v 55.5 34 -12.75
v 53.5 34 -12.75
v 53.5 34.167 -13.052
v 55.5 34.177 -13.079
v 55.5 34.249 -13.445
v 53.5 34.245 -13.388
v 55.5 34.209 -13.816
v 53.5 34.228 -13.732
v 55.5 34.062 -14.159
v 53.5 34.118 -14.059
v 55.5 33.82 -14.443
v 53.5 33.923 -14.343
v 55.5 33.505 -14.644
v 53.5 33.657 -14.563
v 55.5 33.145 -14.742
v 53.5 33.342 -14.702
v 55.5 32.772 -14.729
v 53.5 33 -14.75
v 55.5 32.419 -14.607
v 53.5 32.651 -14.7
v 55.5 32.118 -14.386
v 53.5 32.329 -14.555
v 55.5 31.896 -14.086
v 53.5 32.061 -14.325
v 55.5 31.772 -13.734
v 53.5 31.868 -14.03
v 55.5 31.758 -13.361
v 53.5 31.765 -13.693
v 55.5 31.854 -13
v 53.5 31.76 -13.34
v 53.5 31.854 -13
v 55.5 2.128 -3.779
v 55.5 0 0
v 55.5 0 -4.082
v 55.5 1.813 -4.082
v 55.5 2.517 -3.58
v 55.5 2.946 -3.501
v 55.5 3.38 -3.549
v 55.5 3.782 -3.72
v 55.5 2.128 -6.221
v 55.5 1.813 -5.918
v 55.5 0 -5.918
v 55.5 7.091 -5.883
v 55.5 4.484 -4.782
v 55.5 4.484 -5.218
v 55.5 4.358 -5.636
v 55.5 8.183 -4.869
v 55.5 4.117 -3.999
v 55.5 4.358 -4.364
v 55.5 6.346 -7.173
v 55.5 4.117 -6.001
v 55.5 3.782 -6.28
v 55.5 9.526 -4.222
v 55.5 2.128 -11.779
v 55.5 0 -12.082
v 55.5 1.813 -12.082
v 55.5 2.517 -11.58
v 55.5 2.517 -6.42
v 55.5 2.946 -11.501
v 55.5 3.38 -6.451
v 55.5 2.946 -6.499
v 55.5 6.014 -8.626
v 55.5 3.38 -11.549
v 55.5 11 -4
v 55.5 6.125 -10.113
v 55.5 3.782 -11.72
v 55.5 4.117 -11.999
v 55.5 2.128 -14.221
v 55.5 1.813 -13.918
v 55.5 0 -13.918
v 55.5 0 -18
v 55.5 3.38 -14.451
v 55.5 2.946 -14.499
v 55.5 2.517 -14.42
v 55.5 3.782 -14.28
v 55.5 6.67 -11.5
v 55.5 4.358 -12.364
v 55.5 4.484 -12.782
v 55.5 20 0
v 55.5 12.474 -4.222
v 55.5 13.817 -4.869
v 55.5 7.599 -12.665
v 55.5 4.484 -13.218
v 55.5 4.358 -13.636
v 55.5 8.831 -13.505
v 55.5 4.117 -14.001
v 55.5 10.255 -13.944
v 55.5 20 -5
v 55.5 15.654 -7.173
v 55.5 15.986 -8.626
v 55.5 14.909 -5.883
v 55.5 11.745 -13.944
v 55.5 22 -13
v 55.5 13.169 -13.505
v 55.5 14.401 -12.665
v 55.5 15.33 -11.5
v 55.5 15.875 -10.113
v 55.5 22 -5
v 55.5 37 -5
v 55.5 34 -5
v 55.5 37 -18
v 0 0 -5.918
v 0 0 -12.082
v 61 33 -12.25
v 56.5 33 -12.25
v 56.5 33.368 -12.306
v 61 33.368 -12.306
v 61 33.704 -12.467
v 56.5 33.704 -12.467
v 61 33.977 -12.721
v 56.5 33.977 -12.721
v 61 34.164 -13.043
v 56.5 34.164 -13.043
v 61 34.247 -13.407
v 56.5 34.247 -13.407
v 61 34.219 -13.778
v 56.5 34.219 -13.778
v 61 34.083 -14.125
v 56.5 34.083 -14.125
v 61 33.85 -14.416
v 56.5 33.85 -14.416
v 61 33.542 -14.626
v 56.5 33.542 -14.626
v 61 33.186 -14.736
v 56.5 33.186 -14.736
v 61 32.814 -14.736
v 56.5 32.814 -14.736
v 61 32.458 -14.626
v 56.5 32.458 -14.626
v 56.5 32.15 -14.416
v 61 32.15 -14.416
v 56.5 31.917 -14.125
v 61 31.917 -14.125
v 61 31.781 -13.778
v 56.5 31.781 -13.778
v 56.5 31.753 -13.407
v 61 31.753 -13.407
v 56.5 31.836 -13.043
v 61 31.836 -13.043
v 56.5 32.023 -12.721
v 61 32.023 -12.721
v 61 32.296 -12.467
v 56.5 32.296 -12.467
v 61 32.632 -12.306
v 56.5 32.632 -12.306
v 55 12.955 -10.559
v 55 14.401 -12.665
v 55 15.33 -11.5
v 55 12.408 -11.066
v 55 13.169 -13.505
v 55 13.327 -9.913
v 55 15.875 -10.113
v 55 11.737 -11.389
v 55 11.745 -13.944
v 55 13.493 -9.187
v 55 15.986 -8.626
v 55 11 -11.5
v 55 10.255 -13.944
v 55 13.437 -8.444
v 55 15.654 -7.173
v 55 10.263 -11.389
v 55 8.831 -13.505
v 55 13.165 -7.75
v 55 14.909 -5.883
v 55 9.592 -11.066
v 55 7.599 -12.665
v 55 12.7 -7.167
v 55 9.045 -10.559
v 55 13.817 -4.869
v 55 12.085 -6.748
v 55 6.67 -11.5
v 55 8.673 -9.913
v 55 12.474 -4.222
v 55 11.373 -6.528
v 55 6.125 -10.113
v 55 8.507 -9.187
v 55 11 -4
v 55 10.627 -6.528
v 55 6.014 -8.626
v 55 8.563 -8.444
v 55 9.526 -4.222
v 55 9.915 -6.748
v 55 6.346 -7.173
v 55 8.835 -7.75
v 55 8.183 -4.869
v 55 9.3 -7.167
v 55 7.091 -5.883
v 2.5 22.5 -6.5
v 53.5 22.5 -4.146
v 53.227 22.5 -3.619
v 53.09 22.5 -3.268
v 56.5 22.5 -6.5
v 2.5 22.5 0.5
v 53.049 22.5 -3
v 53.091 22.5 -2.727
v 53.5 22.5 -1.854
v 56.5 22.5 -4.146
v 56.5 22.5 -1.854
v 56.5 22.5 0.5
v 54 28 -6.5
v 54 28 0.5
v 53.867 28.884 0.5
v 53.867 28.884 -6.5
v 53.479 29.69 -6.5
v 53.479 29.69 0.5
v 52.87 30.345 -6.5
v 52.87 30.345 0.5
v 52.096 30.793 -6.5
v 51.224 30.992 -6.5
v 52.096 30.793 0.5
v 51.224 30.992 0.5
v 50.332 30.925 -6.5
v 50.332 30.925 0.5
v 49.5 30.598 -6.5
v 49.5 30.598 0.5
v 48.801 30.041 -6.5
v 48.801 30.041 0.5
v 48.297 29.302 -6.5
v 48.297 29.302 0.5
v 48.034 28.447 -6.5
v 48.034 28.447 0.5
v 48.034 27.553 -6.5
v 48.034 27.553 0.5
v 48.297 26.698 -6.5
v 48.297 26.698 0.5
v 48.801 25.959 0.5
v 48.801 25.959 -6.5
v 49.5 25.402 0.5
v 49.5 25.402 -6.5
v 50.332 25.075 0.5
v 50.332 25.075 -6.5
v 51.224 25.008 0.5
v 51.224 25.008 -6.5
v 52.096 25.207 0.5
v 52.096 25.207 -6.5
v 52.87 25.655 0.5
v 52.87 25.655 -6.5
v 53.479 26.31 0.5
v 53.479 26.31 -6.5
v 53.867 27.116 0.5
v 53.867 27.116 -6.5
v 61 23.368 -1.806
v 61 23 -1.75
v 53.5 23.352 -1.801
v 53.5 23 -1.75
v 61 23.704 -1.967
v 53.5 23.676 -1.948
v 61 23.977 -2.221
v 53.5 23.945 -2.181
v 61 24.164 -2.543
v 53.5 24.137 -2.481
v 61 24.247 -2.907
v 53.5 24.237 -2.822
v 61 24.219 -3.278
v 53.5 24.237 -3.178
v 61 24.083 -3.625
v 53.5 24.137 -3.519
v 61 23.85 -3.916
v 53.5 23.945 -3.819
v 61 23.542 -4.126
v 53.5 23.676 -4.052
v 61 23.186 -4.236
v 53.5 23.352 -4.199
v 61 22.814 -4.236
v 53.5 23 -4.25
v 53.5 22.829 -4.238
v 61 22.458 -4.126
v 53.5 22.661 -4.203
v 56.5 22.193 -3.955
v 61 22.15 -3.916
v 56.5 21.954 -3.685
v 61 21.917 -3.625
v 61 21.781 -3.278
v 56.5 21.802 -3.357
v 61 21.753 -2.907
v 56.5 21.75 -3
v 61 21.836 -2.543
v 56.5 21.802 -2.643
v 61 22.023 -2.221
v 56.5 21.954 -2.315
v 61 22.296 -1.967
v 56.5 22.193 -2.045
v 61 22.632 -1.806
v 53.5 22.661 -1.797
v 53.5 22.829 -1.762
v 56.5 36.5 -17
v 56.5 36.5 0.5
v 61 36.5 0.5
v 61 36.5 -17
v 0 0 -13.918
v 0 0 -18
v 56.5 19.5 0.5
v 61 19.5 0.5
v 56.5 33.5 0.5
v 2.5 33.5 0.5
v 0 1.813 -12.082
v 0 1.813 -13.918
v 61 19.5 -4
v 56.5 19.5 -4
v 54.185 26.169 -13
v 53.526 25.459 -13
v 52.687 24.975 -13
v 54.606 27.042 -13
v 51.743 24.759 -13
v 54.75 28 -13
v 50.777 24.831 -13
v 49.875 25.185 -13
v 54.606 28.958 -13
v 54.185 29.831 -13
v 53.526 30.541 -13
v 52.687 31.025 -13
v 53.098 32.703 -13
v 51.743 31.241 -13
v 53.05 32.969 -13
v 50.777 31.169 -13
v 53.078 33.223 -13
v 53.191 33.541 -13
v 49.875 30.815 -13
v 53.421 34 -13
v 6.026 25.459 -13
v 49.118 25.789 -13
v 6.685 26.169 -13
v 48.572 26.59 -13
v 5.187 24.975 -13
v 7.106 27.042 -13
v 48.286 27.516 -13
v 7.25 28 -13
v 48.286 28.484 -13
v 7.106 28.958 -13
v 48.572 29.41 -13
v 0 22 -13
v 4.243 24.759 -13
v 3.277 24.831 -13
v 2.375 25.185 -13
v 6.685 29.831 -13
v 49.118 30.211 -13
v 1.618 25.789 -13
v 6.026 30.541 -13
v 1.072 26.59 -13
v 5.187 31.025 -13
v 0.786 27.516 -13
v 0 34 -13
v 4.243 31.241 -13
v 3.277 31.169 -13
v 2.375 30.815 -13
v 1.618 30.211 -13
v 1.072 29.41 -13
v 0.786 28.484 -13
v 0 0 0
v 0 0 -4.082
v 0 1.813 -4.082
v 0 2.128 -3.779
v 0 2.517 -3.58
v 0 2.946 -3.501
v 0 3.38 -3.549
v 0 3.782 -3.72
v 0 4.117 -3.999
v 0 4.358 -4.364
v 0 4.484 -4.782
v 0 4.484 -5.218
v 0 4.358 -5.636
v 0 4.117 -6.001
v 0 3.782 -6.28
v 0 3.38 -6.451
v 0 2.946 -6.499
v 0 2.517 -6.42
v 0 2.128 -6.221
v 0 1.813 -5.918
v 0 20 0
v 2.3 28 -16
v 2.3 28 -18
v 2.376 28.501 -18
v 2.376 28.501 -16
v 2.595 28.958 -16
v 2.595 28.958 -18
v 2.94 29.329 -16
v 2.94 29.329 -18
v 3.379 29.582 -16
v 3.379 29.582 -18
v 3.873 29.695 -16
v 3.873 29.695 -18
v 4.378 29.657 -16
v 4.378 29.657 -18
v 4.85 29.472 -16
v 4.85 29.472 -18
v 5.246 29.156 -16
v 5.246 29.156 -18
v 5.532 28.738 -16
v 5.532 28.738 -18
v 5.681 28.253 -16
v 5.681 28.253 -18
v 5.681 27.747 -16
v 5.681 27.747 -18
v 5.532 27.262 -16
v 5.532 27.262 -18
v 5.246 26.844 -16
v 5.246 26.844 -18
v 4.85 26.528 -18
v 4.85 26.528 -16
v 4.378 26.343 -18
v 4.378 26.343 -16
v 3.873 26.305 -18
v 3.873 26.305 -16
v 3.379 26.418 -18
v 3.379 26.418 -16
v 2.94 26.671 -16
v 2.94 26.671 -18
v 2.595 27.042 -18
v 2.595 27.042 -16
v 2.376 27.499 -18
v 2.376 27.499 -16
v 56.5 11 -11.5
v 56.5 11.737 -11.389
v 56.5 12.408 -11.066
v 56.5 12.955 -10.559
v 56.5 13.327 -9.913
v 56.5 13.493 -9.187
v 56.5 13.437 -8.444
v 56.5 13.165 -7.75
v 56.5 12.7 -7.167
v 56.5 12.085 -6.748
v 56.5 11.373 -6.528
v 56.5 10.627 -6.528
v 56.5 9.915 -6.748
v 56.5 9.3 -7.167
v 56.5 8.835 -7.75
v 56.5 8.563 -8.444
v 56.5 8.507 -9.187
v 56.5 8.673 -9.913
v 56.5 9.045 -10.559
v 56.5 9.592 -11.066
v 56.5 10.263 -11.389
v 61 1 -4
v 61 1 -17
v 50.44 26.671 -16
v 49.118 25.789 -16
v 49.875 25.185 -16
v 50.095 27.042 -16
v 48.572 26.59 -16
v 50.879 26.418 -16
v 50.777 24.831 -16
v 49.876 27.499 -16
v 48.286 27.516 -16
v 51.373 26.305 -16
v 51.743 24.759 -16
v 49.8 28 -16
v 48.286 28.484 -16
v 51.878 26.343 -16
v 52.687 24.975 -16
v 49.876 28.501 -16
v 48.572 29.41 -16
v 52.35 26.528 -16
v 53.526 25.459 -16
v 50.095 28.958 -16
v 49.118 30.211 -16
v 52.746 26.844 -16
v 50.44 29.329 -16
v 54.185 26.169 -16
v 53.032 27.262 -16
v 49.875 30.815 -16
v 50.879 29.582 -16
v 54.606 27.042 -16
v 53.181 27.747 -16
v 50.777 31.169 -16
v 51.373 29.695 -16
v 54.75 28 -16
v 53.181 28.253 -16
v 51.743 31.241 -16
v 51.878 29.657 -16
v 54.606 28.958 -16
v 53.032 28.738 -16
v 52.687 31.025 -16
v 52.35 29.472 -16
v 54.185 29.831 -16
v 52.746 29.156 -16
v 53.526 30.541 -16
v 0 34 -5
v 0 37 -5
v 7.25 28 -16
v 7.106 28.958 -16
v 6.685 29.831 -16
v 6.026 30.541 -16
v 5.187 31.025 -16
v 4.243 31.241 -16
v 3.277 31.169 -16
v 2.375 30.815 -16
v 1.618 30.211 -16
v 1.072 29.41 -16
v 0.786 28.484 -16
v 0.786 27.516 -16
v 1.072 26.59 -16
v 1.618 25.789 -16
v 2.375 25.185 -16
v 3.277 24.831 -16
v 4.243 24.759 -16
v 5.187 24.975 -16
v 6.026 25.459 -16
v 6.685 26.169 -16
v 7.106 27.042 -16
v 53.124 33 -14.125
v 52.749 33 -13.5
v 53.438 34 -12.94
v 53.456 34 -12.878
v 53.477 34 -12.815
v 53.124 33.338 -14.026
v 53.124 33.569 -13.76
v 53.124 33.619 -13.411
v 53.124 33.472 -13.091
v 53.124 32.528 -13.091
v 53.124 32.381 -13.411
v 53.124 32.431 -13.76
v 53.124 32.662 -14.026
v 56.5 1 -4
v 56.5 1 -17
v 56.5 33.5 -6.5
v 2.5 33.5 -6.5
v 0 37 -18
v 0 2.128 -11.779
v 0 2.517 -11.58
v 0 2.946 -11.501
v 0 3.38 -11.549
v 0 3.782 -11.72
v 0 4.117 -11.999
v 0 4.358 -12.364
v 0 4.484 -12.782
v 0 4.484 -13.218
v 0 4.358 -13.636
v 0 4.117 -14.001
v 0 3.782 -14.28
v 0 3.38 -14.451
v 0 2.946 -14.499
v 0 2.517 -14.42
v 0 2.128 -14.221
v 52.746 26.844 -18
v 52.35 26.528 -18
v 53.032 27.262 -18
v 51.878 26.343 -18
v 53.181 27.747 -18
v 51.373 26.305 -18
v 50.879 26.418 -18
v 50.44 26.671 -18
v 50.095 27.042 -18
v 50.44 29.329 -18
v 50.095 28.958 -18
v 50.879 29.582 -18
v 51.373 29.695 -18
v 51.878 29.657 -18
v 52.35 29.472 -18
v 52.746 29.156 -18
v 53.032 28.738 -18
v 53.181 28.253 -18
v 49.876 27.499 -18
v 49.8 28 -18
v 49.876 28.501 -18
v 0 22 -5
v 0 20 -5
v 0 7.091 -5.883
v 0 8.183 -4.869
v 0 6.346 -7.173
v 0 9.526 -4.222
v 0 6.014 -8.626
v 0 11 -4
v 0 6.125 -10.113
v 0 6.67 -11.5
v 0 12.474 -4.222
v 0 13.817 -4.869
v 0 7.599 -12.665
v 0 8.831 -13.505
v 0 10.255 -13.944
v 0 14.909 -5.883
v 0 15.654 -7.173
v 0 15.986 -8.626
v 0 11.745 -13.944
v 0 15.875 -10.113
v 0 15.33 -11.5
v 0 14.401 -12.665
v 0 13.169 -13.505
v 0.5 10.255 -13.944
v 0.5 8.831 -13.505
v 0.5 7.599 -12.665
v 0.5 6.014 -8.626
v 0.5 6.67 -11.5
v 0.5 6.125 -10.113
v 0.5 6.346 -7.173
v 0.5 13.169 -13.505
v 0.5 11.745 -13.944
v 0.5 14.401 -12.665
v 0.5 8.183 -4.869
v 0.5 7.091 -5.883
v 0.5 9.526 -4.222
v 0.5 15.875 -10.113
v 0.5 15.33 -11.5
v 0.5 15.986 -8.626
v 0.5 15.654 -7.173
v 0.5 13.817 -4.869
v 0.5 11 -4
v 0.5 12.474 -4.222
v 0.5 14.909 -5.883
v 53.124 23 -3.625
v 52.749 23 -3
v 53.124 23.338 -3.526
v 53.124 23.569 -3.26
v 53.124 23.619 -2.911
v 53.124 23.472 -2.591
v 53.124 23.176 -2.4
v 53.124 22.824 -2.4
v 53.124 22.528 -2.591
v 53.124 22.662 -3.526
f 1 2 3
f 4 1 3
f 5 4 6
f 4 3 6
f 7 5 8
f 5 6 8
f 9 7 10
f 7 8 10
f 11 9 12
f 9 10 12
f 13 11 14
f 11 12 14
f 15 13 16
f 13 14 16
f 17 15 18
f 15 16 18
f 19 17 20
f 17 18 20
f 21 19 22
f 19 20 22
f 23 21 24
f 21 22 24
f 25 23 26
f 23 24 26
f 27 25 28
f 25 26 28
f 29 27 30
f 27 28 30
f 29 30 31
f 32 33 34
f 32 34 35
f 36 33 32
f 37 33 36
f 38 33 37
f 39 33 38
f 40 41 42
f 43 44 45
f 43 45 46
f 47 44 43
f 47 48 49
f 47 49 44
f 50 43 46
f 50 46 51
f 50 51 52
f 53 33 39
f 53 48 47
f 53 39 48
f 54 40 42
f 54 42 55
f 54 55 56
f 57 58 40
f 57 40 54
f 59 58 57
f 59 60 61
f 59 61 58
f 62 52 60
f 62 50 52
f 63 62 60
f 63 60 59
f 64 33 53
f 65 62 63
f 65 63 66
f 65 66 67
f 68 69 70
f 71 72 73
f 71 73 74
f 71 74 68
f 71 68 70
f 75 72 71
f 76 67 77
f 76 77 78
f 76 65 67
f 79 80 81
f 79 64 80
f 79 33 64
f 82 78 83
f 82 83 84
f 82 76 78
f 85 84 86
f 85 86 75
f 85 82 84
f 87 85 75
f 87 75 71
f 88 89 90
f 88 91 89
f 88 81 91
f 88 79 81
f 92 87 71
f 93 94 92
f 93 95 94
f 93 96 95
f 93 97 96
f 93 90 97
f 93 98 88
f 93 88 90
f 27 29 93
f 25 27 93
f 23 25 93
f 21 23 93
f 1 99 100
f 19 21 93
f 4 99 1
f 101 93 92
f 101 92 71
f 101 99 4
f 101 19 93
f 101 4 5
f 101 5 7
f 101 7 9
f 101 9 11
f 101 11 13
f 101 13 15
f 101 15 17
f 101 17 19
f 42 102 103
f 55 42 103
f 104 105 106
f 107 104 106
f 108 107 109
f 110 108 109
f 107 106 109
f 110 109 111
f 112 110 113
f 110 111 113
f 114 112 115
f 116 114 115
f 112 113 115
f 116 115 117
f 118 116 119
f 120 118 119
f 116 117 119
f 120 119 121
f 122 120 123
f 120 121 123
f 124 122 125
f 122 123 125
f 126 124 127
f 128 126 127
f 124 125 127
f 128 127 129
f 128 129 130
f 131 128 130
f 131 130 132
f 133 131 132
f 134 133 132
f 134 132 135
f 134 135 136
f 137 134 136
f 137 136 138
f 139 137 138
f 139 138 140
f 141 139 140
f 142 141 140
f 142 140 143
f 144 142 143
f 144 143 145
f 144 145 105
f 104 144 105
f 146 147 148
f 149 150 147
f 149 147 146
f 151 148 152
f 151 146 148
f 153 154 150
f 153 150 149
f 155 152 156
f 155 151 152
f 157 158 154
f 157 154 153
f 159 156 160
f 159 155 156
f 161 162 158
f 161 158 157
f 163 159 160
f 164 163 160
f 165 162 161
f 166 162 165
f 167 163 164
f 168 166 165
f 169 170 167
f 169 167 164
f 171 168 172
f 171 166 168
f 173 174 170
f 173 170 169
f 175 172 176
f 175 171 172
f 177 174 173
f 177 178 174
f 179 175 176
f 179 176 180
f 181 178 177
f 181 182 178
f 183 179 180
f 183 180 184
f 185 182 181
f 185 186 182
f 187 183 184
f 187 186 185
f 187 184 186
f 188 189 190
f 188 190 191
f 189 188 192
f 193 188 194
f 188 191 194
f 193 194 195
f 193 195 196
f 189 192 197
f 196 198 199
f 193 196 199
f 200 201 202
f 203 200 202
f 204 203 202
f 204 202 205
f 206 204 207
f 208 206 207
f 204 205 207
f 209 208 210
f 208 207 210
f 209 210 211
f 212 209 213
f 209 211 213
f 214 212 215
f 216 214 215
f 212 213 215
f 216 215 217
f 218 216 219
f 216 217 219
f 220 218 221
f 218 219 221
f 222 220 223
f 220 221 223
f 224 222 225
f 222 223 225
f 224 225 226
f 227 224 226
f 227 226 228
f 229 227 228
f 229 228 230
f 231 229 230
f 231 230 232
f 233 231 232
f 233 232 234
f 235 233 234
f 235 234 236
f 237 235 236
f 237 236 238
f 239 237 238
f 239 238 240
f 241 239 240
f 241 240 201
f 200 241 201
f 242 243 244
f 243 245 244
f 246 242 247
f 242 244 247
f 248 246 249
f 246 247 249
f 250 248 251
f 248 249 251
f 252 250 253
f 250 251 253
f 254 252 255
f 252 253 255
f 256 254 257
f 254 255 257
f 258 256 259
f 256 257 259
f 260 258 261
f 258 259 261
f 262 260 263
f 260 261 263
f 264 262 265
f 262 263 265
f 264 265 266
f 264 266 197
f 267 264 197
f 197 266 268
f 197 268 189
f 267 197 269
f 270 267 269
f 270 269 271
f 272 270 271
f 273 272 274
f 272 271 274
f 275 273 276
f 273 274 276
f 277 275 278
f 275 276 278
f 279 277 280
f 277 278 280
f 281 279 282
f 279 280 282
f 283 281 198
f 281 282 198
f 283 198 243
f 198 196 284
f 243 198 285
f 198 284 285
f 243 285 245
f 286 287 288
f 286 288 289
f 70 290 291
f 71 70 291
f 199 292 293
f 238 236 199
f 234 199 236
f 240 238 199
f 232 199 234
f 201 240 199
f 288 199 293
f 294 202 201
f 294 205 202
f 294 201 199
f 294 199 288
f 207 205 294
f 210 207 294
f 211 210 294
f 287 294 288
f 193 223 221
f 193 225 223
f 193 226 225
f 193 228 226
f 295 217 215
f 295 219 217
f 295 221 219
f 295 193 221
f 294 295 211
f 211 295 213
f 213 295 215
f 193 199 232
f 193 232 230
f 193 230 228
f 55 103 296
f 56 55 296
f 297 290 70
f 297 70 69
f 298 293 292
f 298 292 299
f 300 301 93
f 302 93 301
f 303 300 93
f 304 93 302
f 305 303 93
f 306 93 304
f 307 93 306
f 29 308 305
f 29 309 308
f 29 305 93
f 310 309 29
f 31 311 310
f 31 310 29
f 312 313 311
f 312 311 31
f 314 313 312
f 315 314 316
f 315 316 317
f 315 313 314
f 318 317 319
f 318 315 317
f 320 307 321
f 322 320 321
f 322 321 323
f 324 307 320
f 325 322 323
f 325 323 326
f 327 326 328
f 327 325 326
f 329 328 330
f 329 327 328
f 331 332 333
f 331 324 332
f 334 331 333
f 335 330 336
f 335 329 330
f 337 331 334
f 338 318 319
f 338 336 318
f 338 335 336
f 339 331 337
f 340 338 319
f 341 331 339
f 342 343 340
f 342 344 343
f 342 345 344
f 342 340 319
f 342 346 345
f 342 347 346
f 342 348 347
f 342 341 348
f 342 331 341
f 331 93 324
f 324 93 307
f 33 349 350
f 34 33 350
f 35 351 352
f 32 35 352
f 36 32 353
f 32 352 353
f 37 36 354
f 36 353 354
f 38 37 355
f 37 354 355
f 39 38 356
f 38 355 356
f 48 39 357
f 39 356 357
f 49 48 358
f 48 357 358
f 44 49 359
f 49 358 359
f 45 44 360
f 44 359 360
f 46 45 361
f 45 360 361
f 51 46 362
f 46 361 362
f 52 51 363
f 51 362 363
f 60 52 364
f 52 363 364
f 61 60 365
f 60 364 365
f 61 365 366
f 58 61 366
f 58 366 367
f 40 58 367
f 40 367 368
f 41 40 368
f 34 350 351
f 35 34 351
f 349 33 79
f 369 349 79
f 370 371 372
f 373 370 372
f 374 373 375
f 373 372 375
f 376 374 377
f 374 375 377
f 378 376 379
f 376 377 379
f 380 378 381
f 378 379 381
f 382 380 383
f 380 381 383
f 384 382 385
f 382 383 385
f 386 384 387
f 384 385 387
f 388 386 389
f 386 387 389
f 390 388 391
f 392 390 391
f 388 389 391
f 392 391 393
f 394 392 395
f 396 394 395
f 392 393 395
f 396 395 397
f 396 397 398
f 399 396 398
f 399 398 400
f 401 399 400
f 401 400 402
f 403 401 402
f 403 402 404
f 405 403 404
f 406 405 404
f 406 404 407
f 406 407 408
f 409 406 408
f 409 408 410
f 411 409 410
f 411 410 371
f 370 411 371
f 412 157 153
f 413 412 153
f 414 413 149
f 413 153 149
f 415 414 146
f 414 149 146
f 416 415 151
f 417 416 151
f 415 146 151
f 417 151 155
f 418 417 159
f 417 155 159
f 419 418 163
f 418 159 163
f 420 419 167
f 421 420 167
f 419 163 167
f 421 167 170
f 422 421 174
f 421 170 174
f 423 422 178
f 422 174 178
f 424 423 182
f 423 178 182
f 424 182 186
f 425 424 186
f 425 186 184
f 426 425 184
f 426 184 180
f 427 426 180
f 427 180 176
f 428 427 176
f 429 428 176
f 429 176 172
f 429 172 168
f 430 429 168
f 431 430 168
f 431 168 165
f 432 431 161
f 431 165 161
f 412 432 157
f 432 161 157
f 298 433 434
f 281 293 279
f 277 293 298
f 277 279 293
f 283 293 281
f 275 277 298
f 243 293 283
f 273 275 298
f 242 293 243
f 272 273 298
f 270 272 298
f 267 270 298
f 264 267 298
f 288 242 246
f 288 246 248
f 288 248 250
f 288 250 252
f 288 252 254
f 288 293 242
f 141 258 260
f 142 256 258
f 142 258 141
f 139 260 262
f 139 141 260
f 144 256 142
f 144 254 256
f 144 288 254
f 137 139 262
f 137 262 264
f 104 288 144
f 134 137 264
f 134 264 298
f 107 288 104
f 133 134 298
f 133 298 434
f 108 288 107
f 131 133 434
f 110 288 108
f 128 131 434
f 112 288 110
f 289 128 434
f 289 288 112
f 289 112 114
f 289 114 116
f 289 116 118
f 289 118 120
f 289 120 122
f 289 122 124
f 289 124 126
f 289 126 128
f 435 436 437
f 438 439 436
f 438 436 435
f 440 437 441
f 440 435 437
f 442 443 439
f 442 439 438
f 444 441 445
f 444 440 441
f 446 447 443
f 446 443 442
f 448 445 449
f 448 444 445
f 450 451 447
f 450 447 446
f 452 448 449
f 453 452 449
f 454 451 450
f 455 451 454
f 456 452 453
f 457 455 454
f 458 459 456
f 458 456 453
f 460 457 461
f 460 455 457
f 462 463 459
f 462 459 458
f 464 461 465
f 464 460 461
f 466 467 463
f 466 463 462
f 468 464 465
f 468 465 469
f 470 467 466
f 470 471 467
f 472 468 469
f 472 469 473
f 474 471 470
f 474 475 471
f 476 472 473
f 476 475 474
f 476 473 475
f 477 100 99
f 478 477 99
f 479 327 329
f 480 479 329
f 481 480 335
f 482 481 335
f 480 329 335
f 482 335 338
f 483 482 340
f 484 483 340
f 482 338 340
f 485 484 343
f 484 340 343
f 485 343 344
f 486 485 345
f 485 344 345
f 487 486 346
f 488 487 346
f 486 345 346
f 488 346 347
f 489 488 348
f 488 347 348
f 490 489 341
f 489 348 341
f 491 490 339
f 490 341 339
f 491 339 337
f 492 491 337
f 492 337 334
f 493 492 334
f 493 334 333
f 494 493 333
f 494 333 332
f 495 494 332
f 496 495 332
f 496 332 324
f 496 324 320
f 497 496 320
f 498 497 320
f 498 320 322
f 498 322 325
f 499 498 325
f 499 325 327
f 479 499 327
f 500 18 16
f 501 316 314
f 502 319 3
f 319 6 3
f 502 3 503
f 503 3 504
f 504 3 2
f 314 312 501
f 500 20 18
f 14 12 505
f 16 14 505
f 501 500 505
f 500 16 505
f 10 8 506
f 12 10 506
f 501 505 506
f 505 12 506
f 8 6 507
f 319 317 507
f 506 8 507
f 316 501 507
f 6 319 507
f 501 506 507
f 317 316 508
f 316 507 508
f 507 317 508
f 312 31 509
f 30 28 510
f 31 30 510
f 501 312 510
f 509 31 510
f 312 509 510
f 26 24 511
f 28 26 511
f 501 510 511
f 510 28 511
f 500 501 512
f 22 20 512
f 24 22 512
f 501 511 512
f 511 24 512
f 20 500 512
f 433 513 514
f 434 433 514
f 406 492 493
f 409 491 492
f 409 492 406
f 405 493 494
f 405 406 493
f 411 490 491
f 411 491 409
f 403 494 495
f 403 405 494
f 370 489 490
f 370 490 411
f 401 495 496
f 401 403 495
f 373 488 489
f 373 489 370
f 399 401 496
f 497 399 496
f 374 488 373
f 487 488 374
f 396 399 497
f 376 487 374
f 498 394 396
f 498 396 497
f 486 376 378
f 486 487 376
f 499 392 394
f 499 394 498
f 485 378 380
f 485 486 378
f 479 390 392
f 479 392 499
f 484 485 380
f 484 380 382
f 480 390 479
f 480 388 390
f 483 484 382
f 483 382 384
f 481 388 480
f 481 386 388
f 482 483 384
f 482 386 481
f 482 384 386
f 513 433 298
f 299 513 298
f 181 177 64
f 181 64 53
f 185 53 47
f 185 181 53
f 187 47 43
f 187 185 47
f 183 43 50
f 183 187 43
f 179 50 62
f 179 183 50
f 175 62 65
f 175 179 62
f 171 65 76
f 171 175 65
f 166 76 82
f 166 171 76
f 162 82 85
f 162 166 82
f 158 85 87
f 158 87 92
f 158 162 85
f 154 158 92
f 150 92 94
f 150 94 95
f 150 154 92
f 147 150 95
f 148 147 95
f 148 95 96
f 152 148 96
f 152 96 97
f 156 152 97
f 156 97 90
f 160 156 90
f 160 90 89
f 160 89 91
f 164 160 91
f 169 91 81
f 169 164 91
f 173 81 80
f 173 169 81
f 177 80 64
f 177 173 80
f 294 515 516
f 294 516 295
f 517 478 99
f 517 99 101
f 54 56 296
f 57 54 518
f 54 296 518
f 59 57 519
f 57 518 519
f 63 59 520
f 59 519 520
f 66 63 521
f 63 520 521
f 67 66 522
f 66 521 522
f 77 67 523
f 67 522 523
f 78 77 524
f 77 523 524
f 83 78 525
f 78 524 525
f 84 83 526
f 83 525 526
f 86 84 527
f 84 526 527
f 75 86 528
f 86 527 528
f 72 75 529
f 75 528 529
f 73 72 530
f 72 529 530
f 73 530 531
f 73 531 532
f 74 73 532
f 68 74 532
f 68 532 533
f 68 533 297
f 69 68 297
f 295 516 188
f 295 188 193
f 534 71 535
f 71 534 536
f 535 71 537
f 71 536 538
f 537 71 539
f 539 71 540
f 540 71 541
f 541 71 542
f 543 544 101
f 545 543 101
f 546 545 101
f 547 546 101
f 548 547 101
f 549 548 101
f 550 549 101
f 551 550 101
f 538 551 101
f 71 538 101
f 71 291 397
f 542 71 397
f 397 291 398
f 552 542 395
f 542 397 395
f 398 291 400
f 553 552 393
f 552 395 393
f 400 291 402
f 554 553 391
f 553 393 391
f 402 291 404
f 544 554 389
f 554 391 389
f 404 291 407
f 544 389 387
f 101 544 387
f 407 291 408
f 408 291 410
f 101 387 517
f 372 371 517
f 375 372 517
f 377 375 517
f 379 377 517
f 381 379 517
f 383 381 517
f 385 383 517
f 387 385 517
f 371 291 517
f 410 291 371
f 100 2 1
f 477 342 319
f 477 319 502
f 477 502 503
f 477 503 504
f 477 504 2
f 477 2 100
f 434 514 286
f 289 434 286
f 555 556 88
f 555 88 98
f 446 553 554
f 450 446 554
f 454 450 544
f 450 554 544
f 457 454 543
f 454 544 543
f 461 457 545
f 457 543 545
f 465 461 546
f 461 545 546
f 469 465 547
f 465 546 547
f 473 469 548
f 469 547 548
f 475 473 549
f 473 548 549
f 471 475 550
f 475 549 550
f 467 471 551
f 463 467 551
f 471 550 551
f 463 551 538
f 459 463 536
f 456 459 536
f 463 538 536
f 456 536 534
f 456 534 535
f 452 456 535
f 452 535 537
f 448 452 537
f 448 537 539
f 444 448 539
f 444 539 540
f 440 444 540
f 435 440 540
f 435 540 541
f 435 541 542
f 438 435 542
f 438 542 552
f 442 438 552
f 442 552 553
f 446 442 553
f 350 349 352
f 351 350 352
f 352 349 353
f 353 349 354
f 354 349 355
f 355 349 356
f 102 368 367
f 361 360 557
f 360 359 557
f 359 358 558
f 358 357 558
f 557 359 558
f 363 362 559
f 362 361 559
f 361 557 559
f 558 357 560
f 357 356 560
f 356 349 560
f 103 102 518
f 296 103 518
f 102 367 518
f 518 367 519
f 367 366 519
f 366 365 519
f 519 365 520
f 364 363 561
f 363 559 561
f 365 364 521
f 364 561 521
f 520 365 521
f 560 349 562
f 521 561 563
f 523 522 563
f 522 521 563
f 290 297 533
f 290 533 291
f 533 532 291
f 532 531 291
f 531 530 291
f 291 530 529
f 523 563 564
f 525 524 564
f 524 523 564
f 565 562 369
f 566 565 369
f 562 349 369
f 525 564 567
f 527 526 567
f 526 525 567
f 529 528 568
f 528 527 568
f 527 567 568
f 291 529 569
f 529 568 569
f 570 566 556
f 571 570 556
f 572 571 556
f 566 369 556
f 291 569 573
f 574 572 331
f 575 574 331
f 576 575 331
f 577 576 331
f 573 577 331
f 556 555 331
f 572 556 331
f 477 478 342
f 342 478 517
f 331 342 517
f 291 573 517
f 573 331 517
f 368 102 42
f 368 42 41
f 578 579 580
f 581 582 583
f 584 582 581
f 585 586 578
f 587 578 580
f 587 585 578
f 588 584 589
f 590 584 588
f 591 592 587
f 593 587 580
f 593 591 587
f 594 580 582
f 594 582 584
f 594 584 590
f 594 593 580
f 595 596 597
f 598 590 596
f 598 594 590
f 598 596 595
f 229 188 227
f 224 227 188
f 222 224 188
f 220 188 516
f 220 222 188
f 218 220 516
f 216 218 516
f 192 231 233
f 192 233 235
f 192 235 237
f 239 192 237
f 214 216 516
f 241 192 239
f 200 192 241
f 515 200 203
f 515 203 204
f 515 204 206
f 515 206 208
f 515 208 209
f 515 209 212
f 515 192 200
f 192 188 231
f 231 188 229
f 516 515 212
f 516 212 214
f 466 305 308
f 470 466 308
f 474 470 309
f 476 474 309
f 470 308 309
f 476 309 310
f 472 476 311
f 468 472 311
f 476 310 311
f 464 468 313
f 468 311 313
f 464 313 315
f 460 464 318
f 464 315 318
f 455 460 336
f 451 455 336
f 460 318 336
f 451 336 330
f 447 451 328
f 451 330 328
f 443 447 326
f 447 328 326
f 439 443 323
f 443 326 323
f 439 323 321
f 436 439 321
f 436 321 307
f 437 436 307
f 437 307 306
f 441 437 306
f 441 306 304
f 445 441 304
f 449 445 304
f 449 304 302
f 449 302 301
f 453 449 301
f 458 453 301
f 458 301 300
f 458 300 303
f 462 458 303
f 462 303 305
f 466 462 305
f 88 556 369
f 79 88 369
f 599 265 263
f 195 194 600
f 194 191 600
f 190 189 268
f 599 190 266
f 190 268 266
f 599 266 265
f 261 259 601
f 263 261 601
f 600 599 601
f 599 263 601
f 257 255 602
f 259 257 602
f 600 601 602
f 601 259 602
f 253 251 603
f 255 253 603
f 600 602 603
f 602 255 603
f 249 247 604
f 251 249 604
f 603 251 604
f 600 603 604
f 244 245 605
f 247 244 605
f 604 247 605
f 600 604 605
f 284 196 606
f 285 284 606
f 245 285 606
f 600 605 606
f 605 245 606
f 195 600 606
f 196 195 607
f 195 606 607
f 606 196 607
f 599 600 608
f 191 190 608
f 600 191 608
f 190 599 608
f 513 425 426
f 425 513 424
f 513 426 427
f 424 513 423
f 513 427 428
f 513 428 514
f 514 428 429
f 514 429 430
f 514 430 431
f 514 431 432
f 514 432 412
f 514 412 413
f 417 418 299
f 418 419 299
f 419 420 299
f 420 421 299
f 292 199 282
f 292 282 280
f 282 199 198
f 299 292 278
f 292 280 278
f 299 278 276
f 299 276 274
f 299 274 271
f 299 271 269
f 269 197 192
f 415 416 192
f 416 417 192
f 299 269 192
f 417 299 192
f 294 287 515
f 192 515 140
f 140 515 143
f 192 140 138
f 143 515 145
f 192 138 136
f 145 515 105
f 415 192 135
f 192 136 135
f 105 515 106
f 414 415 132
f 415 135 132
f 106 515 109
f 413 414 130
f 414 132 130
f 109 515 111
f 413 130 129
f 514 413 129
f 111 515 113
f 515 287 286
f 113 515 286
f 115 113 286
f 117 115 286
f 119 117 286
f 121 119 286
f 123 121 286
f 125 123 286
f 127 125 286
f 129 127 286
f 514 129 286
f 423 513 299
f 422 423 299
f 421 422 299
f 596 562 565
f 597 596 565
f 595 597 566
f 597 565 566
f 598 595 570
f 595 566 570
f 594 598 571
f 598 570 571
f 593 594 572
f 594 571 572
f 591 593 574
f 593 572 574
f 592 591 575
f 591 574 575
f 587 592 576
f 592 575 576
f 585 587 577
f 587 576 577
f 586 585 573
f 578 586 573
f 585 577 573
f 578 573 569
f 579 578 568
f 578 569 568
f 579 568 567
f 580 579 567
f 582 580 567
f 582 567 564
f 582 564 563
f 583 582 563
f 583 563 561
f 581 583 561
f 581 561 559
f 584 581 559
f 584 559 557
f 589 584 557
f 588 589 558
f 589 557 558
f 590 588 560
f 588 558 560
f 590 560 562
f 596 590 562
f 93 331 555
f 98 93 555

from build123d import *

# Parameters (mm, degrees)
SKETCH_1_W                     = 18
SKETCH_1_H                     = 37
EXTRUDE_1_DEPTH                = 55.5
SKETCH_2_R                     = 5
CUT_EXTRUDE_1_DEPTH            = 0.5
CUT_EXTRUDE_START              = -0.5
SKETCH_3_R                     = 5
CUT_EXTRUDE_2_DEPTH            = 0.5
SKETCH_4_R                     = 1.5
CUT_EXTRUDE_3_DEPTH            = 70.088711089
SKETCH_5_W                     = 1.835428096
SKETCH_5_H                     = 2.75652024
CUT_EXTRUDE_4_DEPTH            = 70.088711089
SKETCH_6_W                     = 5
SKETCH_6_H                     = 17
CUT_EXTRUDE_5_DEPTH            = 70.088711089
SKETCH_7_W                     = 8
SKETCH_7_H                     = 12
CUT_EXTRUDE_6_DEPTH            = 70.088711089
SKETCH_8_R                     = 2.5
EXTRUDE_2_DEPTH                = 1.5
SKETCH_9_W                     = 17.5
SKETCH_9_H                     = 35.5
EXTRUDE_3_DEPTH                = 4.5
SKETCH_10_W                    = 7
SKETCH_10_H                    = 11
EXTRUDE_4_DEPTH                = 54
CUT_EXTRUDE_7_REACH            = 75.58
SKETCH_11_W                    = 4.5
SKETCH_11_H                    = 18.5
HOLE_WIZARD_M3_1_D             = 2.5
HOLE_WIZARD_M3_1_DEPTH         = 7.5
HOLE_WIZARD_M3_1_TIP           = 0.751075774
HOLE_WIZARD_M3_1_2_D           = 3.4
HOLE_WIZARD_M3_1_2_DEPTH       = 5
HOLE_WIZARD_M3_1_2_CBORE_D     = 6.5
HOLE_WIZARD_M3_1_2_CBORE_DEPTH = 3
CUT_EXTRUDE_8_REACH            = 75.704
SKETCH_16_R                    = 3


with BuildPart() as part:
    # 草图1 → 凸台-拉伸1 (new body)
    with BuildSketch(Plane(origin=(0, 0, 0), x_dir=(0, 0, -1), z_dir=(1, 0, 0))):
        with Locations((9, 18.5)):
            Rectangle(SKETCH_1_W, SKETCH_1_H)
    extrude(amount=EXTRUDE_1_DEPTH)

    # 草图2 → 切除-拉伸1 (cut)
    with BuildSketch(Plane.ZY):
        with Locations((-9, 11)):
            Circle(SKETCH_2_R)
    extrude(amount=-CUT_EXTRUDE_1_DEPTH, mode=Mode.SUBTRACT)

    # 草图3 → 切除-拉伸2 (cut)
    with BuildSketch(Plane(origin=(55.5, 0, 0), x_dir=(0, 0, -1), z_dir=(1, 0, 0)).offset(CUT_EXTRUDE_START)):
        with Locations(Location((9, 11, 0), (0, 0, 180))):
            Circle(SKETCH_3_R)
    extrude(amount=CUT_EXTRUDE_2_DEPTH, mode=Mode.SUBTRACT)

    # 草图4 → 切除-拉伸3 (cut, through all)
    with BuildSketch(Plane.ZY):
        with Locations((-13, 3)):
            Circle(SKETCH_4_R)
        with Locations(Location((-5, 3, 0), (0, 0, 180))):
            Circle(SKETCH_4_R)
    extrude(amount=-CUT_EXTRUDE_3_DEPTH, mode=Mode.SUBTRACT)

    # 草图5 → 切除-拉伸4 (cut, through all)
    with BuildSketch(Plane.ZY):
        with Locations((-13, 1.37826012)):
            Rectangle(SKETCH_5_W, SKETCH_5_H)
        with Locations((-5, 1.37826012)):
            Rectangle(SKETCH_5_W, SKETCH_5_H)
    extrude(amount=-CUT_EXTRUDE_4_DEPTH, mode=Mode.SUBTRACT)

    # 草图6 → 切除-拉伸5 (cut, through all)
    with BuildSketch(Plane.ZY):
        with Locations((-2.5, 28.5)):
            Rectangle(SKETCH_6_W, SKETCH_6_H)
    extrude(amount=-CUT_EXTRUDE_5_DEPTH, mode=Mode.SUBTRACT)

    # 草图7 → 切除-拉伸6 (cut, through all)
    with BuildSketch(Plane.ZY):
        with Locations((-9, 28)):
            Rectangle(SKETCH_7_W, SKETCH_7_H)
    extrude(amount=-CUT_EXTRUDE_6_DEPTH, mode=Mode.SUBTRACT)

    # 草图8 → 凸台-拉伸2 (add)
    with BuildSketch(Plane(origin=(55, 0, 0), x_dir=(0, 0, -1), z_dir=(1, 0, 0))):
        with Locations((9, 11)):
            Circle(SKETCH_8_R)
    extrude(amount=EXTRUDE_2_DEPTH)

    # 草图9 → 凸台-拉伸3 (add)
    with BuildSketch(Plane(origin=(56.5, 0, 0), x_dir=(0, 0, -1), z_dir=(1, 0, 0))):
        with Locations((8.25, 18.75)):
            Rectangle(SKETCH_9_W, SKETCH_9_H)
    extrude(amount=EXTRUDE_3_DEPTH)

    # 草图10 → 凸台-拉伸4 (add)
    with BuildSketch(Plane.ZY.offset(-56.5)):
        with Locations((-3, 28)):
            Rectangle(SKETCH_10_W, SKETCH_10_H)
    extrude(amount=EXTRUDE_4_DEPTH)

    # 草图11 → 切除-拉伸7 (cut, up to next)
    with BuildSketch(Plane(origin=(61, 0, 0), x_dir=(0, 0, -1), z_dir=(1, 0, 0)), mode=Mode.PRIVATE) as cut_extrude_7_sk1:
        with Locations((1.75, 10.25)):
            Rectangle(SKETCH_11_W, SKETCH_11_H)
    cut_extrude_7_tool1 = extrude(cut_extrude_7_sk1.sketch, amount=-CUT_EXTRUDE_7_REACH, mode=Mode.PRIVATE) & part.part
    add(cut_extrude_7_tool1.solids().sort_by_distance((61, 10.25, -1.75))[0], mode=Mode.SUBTRACT)

    # Hole Wizard M3 _1
    with Locations(Plane(origin=(61, 0, 0), x_dir=(0, 0, -1), z_dir=(1, 0, 0))):
        with Locations((13.5, 33), (3, 23)):
            Hole(HOLE_WIZARD_M3_1_D / 2, depth=HOLE_WIZARD_M3_1_DEPTH)
            with Locations((0, 0, -(HOLE_WIZARD_M3_1_DEPTH + HOLE_WIZARD_M3_1_TIP / 2))):  # 118° drill point
                Cone(0, HOLE_WIZARD_M3_1_D / 2, HOLE_WIZARD_M3_1_TIP, mode=Mode.SUBTRACT)

    # Hole Wizard M3 _1 2
    with Locations(Plane.XY.offset(-13)):
        with Locations((4, 28), (51.5, 28)):
            CounterBoreHole(HOLE_WIZARD_M3_1_2_D / 2, HOLE_WIZARD_M3_1_2_CBORE_D / 2, HOLE_WIZARD_M3_1_2_CBORE_DEPTH, depth=HOLE_WIZARD_M3_1_2_DEPTH)

    # 草图16 → 切除-拉伸8 (cut, up to next)
    with BuildSketch(Plane.XY.offset(0.5), mode=Mode.PRIVATE) as cut_extrude_8_sk1:
        with Locations((51, 28)):
            Circle(SKETCH_16_R)
    cut_extrude_8_tool1 = extrude(cut_extrude_8_sk1.sketch, amount=-CUT_EXTRUDE_8_REACH, mode=Mode.PRIVATE) & part.part
    add(cut_extrude_8_tool1.solids().sort_by_distance((51, 28, 0.5))[0], mode=Mode.SUBTRACT)


solid = part.part
